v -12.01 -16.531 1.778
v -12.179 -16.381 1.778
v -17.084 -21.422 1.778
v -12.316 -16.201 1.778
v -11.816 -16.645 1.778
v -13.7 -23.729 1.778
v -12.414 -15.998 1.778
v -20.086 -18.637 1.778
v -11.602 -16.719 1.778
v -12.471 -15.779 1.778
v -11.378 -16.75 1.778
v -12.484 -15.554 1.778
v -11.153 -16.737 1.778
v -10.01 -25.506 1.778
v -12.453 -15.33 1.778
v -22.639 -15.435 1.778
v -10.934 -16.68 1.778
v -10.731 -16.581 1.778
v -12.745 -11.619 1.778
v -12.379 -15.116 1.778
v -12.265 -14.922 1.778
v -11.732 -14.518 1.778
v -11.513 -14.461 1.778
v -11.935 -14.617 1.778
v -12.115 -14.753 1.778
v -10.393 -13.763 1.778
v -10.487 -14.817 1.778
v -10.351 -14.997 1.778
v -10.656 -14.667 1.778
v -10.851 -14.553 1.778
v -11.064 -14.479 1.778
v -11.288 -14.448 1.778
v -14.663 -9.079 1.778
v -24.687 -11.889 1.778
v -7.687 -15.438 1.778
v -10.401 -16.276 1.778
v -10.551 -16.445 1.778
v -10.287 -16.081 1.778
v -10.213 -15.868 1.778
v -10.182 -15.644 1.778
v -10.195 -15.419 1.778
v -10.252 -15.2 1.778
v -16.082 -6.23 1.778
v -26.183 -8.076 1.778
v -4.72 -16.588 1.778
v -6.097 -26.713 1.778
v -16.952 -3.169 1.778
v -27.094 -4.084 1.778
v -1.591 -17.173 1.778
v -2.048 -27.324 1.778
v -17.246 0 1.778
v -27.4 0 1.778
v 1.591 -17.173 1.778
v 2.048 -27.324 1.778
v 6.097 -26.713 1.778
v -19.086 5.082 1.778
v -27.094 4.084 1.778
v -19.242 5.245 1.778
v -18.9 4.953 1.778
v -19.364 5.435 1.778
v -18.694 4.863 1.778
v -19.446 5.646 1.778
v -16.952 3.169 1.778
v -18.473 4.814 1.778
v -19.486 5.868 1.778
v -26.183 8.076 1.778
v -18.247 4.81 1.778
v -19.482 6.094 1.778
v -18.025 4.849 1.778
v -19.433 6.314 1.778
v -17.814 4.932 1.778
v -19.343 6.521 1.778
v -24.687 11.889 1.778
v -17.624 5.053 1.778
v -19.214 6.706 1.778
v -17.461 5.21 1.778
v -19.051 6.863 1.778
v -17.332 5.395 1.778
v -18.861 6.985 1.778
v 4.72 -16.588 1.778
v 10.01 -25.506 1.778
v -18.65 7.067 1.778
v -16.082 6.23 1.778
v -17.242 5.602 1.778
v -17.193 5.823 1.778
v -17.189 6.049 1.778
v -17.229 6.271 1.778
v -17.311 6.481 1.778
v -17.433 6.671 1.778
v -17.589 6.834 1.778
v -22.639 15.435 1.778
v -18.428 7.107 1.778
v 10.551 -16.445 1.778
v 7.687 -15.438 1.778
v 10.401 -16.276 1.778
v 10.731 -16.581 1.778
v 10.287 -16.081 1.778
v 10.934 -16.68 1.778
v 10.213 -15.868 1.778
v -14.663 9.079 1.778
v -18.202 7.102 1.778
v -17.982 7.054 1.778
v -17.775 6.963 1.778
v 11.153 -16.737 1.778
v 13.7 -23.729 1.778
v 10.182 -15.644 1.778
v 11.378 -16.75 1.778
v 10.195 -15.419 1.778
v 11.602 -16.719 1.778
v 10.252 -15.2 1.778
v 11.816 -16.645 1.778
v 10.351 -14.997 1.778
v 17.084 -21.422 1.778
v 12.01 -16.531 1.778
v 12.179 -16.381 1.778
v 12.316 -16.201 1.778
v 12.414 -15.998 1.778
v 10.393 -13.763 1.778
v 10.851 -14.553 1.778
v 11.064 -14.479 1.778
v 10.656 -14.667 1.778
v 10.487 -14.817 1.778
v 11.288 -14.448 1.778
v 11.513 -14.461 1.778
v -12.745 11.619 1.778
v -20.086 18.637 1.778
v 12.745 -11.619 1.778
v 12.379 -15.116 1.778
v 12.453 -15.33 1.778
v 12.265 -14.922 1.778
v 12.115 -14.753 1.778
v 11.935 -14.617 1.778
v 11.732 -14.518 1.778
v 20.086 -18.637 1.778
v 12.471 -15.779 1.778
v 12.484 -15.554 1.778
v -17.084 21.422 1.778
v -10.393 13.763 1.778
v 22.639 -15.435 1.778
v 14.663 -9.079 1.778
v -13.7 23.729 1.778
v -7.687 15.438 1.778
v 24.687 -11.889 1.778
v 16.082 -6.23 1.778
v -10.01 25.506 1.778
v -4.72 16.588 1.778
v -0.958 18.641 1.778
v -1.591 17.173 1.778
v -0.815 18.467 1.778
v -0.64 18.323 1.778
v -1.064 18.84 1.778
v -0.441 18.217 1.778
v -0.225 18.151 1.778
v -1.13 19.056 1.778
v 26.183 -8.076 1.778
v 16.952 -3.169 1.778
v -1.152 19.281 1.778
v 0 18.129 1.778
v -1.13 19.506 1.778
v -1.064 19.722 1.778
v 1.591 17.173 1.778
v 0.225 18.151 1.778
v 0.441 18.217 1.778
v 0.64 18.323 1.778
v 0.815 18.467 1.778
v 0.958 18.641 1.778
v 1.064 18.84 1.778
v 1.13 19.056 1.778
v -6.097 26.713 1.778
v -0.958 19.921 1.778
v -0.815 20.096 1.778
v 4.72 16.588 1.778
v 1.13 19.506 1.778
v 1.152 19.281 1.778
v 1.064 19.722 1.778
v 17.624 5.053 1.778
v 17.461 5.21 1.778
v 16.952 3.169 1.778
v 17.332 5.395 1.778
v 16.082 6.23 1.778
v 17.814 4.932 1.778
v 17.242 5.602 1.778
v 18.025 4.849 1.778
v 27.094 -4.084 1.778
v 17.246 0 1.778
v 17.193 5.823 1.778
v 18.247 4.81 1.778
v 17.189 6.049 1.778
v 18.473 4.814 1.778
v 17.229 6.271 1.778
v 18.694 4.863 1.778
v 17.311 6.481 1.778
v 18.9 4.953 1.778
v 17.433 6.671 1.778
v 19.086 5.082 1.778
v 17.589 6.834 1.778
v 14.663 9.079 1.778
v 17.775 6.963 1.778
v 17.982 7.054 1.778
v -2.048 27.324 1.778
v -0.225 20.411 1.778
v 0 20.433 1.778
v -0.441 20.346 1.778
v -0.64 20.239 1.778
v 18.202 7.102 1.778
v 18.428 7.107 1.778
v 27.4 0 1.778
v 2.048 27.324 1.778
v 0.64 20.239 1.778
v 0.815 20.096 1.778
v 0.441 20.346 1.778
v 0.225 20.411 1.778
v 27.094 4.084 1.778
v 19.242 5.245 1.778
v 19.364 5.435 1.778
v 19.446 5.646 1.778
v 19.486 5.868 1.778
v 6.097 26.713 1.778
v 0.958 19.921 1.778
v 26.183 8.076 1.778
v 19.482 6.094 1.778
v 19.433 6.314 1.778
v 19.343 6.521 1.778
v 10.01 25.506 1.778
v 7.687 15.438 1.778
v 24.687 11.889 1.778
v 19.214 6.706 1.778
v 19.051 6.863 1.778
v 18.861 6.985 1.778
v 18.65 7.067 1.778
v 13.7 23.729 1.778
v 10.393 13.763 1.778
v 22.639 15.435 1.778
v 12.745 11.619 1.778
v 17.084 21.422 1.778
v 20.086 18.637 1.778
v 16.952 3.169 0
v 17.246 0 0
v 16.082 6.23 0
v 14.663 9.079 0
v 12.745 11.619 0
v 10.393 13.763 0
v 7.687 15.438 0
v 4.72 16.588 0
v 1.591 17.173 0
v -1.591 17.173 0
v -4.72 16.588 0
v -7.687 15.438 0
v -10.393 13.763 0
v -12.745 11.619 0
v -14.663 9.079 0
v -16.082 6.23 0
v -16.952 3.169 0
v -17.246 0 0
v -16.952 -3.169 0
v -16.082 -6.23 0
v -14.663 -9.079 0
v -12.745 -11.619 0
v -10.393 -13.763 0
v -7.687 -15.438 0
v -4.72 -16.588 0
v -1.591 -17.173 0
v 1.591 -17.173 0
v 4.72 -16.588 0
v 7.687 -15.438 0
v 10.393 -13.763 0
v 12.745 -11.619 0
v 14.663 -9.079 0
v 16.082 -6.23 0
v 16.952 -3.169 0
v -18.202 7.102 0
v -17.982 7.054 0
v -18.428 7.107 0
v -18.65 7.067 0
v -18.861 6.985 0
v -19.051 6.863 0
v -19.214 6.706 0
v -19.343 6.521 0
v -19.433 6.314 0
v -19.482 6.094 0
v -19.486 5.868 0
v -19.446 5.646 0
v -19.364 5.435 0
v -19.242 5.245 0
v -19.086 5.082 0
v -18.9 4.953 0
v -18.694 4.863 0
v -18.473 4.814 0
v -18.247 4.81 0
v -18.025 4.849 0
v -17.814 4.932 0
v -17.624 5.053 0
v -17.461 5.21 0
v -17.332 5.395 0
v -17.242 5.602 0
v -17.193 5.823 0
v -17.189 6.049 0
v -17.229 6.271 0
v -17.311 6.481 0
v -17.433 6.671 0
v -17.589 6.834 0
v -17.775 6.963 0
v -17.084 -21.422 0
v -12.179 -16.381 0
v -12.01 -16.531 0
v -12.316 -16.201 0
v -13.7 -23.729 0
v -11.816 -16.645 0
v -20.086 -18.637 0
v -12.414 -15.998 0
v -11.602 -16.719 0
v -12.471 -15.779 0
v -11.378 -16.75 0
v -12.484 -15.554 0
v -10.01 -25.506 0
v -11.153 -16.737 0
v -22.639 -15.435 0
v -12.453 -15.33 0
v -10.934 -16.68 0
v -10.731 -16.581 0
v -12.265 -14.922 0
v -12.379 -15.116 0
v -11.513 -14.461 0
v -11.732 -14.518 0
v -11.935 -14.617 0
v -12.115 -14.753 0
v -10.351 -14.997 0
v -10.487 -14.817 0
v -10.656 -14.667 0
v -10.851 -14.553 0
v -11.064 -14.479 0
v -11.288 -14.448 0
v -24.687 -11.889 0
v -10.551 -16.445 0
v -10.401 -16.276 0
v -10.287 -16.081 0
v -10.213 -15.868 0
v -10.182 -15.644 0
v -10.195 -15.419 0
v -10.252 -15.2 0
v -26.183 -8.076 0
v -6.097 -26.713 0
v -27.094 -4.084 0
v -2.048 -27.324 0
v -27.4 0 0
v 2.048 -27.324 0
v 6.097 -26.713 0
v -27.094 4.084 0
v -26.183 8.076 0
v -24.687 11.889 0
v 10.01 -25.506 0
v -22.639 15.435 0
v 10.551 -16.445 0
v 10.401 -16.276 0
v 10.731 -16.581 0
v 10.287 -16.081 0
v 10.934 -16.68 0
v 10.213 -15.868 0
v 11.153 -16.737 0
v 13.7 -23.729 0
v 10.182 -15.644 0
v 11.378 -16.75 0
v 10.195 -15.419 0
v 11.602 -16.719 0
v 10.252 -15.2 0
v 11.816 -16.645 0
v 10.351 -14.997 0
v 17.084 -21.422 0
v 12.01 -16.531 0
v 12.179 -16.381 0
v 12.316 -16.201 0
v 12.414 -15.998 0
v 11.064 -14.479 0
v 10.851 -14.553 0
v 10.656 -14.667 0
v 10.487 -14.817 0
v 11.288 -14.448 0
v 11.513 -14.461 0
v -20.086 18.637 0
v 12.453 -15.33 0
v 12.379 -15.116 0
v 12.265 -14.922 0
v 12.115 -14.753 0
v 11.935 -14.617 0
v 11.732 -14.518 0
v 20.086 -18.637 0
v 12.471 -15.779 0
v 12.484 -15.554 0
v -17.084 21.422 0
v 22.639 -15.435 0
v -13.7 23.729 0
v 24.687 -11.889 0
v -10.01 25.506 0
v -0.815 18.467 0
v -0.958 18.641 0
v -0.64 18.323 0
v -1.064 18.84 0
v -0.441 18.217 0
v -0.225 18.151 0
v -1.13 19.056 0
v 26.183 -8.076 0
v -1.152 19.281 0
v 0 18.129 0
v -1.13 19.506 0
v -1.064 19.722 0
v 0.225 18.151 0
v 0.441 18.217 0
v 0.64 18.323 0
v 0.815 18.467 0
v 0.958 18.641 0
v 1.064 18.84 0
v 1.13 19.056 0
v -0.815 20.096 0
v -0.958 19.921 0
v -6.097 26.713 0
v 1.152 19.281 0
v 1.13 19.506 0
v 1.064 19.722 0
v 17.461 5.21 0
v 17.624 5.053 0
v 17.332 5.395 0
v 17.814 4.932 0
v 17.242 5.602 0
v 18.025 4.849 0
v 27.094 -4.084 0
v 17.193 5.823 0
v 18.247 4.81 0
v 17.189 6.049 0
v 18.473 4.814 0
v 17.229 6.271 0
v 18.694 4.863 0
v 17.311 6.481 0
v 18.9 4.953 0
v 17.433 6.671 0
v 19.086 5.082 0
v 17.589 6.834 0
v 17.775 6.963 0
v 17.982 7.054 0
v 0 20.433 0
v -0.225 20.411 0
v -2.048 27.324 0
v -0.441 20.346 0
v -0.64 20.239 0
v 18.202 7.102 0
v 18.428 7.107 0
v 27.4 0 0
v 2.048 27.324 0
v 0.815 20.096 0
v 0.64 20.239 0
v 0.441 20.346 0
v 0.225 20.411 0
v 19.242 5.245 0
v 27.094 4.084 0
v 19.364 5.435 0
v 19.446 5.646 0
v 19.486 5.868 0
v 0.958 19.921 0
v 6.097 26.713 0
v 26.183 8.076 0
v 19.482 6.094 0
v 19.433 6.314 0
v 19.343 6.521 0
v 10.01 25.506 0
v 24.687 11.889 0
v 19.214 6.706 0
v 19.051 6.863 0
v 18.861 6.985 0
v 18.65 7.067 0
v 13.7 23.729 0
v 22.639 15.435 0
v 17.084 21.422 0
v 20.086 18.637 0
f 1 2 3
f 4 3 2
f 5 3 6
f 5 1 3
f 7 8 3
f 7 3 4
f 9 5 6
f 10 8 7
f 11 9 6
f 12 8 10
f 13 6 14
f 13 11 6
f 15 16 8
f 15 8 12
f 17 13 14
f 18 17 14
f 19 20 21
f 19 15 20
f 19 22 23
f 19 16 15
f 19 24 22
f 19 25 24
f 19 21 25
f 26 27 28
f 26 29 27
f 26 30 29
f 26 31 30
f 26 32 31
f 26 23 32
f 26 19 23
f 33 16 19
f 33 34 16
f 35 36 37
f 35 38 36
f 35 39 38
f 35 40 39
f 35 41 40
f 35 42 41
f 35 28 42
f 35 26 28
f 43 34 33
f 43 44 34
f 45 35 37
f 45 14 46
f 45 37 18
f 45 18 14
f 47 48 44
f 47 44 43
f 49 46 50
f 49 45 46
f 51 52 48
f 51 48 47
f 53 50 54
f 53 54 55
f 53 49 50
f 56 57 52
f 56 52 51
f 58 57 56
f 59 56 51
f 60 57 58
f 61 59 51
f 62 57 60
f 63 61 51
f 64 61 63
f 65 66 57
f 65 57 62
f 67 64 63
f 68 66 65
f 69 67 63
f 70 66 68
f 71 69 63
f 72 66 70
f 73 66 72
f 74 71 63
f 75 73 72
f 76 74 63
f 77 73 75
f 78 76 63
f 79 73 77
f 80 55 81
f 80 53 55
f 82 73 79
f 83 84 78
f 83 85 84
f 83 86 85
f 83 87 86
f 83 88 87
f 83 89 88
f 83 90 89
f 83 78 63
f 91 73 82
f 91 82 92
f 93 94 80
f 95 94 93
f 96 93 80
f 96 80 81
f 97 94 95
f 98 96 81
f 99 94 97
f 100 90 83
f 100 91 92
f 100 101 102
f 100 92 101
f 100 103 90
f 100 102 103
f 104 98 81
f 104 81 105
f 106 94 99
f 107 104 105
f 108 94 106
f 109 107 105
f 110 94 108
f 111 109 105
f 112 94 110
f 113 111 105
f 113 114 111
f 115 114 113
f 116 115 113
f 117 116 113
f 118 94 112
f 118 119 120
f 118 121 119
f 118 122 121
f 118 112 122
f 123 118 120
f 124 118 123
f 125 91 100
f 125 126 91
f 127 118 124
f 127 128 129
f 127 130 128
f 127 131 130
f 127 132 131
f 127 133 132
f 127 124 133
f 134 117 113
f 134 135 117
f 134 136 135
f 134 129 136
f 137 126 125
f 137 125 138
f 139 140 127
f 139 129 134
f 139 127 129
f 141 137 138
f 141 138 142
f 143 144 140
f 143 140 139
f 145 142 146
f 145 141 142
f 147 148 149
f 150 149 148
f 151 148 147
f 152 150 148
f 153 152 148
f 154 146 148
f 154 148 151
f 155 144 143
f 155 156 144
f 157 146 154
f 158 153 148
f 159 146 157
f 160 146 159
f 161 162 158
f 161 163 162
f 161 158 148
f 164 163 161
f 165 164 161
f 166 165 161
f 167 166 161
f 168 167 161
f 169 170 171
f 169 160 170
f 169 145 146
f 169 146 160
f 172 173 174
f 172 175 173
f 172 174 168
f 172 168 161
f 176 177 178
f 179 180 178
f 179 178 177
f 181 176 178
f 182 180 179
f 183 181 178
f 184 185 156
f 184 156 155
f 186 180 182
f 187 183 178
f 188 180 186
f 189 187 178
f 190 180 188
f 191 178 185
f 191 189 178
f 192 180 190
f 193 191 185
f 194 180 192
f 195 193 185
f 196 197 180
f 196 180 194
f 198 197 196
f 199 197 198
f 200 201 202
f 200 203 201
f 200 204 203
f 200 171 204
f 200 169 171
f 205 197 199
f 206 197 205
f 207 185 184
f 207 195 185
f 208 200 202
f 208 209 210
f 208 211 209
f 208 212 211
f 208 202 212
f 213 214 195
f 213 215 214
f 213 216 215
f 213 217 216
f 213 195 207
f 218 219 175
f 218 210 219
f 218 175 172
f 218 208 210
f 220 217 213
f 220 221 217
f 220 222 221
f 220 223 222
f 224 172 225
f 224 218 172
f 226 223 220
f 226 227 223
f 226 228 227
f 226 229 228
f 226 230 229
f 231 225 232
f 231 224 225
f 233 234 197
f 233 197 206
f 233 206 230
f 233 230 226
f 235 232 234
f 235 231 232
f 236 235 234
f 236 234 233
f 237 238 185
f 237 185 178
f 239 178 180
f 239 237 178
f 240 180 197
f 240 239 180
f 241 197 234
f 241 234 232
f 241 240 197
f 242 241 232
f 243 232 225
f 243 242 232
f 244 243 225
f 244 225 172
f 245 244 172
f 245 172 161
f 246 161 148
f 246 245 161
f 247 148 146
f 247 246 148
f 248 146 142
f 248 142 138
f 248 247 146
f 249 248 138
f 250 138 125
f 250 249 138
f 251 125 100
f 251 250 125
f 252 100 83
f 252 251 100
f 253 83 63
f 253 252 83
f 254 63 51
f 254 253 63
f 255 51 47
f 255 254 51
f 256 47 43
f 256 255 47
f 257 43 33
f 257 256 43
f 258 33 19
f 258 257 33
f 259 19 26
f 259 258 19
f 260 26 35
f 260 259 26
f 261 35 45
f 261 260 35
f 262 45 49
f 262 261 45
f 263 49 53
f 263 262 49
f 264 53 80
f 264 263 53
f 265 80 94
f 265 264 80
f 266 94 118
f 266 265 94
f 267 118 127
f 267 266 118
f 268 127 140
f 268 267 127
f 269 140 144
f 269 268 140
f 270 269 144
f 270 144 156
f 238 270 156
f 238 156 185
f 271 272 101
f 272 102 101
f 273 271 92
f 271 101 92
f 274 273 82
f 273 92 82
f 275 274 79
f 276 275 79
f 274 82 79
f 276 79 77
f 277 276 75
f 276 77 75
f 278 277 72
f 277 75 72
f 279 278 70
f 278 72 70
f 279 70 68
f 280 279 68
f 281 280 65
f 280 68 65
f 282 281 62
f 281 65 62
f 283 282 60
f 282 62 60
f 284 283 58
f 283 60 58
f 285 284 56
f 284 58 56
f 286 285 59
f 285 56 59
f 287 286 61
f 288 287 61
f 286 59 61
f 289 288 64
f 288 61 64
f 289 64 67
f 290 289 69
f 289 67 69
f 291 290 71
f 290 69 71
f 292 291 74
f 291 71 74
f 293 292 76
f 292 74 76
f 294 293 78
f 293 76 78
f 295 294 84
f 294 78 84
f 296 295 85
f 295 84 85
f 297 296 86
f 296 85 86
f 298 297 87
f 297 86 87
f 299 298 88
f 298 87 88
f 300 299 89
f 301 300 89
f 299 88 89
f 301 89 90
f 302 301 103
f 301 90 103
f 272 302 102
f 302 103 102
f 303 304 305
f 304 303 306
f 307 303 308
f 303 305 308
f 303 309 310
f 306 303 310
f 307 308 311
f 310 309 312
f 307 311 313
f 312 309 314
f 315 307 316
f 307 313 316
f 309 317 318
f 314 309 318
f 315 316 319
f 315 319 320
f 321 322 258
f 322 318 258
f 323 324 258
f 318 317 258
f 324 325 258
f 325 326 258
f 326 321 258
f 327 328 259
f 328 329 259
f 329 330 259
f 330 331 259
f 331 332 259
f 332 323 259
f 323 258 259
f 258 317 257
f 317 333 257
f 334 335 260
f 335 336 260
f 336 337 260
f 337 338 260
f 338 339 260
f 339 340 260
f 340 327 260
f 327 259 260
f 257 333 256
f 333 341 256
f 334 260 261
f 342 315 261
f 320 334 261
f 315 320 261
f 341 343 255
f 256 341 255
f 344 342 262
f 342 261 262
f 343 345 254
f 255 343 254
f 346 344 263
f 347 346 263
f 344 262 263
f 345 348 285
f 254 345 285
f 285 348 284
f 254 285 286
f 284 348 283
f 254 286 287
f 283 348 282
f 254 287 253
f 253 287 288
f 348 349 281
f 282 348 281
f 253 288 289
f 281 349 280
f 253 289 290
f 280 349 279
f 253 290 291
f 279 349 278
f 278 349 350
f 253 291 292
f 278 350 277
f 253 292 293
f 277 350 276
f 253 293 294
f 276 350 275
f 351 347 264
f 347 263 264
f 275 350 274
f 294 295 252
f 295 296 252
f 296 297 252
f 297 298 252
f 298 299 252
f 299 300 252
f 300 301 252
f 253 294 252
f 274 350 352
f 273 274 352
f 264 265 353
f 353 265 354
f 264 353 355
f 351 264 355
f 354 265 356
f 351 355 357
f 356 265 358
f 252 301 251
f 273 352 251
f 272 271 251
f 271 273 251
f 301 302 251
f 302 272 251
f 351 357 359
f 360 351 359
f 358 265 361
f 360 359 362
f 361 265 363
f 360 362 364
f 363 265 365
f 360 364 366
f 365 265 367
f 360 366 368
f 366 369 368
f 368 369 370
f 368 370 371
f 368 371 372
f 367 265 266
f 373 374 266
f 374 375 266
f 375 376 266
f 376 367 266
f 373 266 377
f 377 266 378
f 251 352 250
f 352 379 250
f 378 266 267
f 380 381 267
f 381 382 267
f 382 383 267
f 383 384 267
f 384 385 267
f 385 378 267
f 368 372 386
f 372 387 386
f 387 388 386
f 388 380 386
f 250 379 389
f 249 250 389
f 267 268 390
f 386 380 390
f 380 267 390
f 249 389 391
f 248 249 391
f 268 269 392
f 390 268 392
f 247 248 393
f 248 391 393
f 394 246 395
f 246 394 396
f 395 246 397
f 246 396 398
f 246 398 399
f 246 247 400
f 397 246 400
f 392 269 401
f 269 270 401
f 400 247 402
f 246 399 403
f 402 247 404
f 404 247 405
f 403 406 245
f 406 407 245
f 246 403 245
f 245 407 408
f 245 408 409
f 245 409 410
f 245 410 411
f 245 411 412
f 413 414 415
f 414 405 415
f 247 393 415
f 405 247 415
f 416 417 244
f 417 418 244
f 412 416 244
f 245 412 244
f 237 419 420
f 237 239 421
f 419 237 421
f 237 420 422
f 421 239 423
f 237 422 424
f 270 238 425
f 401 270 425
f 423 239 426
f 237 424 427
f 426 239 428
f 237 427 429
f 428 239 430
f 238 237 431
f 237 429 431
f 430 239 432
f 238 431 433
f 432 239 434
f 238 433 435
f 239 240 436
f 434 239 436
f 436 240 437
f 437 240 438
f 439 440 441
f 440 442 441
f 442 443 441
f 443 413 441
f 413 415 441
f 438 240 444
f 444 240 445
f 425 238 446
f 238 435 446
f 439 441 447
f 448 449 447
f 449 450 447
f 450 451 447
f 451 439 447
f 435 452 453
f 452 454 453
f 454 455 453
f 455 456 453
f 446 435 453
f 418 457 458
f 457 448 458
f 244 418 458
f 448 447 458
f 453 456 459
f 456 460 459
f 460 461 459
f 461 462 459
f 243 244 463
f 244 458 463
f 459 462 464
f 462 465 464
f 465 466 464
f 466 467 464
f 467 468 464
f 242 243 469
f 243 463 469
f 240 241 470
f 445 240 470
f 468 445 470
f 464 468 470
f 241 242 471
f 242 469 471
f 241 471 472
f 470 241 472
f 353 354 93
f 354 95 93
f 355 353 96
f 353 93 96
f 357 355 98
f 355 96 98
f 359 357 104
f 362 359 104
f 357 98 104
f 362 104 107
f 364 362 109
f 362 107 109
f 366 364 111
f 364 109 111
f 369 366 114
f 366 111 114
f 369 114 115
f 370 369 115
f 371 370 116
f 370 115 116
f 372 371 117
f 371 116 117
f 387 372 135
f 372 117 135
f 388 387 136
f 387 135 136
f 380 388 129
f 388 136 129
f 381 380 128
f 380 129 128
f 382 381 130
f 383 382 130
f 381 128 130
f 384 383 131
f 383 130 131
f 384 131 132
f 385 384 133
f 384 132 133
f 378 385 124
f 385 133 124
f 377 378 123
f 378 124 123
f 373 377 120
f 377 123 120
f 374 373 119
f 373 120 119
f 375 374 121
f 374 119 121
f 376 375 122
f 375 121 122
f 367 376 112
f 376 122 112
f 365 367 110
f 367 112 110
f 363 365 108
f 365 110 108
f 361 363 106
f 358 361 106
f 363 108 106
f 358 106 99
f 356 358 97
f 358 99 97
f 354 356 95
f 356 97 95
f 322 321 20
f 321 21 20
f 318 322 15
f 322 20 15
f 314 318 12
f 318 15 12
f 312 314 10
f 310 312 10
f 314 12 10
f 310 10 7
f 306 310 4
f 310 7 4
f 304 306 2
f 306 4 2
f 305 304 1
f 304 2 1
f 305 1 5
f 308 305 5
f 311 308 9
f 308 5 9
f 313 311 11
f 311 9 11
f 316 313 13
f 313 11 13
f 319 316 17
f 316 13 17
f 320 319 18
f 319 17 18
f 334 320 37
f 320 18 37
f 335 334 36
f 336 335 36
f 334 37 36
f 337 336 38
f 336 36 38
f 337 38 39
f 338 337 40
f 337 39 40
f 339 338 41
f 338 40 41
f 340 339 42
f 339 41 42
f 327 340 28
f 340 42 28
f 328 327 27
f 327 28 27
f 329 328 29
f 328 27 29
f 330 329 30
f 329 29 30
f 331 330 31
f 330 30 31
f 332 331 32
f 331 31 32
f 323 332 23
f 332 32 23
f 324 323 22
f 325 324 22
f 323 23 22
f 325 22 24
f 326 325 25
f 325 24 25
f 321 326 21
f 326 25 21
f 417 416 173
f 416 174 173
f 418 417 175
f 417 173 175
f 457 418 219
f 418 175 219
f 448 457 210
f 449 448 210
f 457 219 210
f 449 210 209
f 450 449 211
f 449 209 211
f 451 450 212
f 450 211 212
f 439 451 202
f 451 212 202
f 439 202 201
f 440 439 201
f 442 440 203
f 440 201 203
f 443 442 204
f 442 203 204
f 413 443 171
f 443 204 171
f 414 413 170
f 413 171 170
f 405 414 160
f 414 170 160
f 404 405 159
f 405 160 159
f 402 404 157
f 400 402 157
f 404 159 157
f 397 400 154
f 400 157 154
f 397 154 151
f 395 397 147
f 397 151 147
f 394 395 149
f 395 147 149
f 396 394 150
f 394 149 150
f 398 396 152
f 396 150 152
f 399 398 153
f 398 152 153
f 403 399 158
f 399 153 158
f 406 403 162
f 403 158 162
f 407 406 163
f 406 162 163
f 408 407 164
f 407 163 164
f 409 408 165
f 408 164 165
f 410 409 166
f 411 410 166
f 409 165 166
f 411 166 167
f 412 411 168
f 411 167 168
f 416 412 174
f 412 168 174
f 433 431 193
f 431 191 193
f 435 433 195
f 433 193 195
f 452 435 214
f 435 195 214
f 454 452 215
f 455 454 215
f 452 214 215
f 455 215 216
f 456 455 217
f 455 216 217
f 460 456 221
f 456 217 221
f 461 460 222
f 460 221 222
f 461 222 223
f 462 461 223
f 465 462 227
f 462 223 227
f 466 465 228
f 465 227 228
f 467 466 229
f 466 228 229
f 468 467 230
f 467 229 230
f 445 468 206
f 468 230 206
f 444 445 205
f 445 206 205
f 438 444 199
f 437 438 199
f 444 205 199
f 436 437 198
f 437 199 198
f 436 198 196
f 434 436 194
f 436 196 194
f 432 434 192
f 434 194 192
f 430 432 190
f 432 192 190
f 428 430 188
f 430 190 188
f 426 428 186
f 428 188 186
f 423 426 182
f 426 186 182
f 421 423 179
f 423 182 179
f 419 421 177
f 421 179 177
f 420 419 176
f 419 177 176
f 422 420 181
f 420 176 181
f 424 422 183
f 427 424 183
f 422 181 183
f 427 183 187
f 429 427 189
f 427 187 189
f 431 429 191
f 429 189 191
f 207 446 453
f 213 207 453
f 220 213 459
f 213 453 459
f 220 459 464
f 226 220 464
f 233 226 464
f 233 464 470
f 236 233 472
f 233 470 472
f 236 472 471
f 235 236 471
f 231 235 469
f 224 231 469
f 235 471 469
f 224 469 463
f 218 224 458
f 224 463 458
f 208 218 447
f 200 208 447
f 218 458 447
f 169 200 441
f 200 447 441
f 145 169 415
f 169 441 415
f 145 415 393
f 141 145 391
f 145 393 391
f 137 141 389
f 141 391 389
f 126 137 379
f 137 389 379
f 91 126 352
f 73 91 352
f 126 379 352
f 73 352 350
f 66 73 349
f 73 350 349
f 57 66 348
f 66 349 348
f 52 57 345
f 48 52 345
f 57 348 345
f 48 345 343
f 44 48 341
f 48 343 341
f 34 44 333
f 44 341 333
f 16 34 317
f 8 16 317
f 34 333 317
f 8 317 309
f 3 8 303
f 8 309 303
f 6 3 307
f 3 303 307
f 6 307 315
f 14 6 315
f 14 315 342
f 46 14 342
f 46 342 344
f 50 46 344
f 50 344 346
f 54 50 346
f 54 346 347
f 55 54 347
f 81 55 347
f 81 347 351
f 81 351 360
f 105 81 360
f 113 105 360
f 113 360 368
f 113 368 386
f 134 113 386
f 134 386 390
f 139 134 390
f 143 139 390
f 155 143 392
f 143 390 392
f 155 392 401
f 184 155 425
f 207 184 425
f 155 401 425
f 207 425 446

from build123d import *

# Parameters (mm, degrees)
F0_R     = 27.400357
F2_DEPTH = 1.778
F1_R     = 17.246114
F3_DEPTH = 1.778
F5_R     = 1.152069
F6_DEPTH = 8.89
F7_COUNT = 5


with BuildPart() as f2:
    # F0 (on Top) → F2 (new body)
    with BuildSketch(Plane.XY):
        Circle(F0_R)
    extrude(amount=F2_DEPTH)

    # F1 (on Top) → F3 (cut, through all)
    with BuildSketch(Plane.XY):
        Circle(F1_R)
    extrude(amount=F3_DEPTH, mode=Mode.SUBTRACT)


with BuildPart() as f6:
    # F5 (on Top) → F6 (new body, symmetric)
    with BuildSketch(Plane.XY):
        with Locations((0, 19.281207)):
            Circle(F5_R)
    extrude(amount=F6_DEPTH, both=True)


with BuildPart() as f7_1:
    # F7: instance of F6
    add(f6.part.rotate(Axis((0, 0, 1.187779), (0, 0, -1)), 1 * 360 / F7_COUNT))


with BuildPart() as f7_2:
    # F7: instance of F6
    add(f6.part.rotate(Axis((0, 0, 1.187779), (0, 0, -1)), 2 * 360 / F7_COUNT))


with BuildPart() as f7_3:
    # F7: instance of F6
    add(f6.part.rotate(Axis((0, 0, 1.187779), (0, 0, -1)), 3 * 360 / F7_COUNT))


with BuildPart() as f7_4:
    # F7: instance of F6
    add(f6.part.rotate(Axis((0, 0, 1.187779), (0, 0, -1)), 4 * 360 / F7_COUNT))


with BuildPart() as f2_1:
    add(f2.part)

    # F8: cut F7_4, F6, F7_1, F7_2, F7_3
    add(f7_4.part, mode=Mode.SUBTRACT)
    add(f6.part, mode=Mode.SUBTRACT)
    add(f7_1.part, mode=Mode.SUBTRACT)
    add(f7_2.part, mode=Mode.SUBTRACT)
    add(f7_3.part, mode=Mode.SUBTRACT)


solid = f2_1.part
